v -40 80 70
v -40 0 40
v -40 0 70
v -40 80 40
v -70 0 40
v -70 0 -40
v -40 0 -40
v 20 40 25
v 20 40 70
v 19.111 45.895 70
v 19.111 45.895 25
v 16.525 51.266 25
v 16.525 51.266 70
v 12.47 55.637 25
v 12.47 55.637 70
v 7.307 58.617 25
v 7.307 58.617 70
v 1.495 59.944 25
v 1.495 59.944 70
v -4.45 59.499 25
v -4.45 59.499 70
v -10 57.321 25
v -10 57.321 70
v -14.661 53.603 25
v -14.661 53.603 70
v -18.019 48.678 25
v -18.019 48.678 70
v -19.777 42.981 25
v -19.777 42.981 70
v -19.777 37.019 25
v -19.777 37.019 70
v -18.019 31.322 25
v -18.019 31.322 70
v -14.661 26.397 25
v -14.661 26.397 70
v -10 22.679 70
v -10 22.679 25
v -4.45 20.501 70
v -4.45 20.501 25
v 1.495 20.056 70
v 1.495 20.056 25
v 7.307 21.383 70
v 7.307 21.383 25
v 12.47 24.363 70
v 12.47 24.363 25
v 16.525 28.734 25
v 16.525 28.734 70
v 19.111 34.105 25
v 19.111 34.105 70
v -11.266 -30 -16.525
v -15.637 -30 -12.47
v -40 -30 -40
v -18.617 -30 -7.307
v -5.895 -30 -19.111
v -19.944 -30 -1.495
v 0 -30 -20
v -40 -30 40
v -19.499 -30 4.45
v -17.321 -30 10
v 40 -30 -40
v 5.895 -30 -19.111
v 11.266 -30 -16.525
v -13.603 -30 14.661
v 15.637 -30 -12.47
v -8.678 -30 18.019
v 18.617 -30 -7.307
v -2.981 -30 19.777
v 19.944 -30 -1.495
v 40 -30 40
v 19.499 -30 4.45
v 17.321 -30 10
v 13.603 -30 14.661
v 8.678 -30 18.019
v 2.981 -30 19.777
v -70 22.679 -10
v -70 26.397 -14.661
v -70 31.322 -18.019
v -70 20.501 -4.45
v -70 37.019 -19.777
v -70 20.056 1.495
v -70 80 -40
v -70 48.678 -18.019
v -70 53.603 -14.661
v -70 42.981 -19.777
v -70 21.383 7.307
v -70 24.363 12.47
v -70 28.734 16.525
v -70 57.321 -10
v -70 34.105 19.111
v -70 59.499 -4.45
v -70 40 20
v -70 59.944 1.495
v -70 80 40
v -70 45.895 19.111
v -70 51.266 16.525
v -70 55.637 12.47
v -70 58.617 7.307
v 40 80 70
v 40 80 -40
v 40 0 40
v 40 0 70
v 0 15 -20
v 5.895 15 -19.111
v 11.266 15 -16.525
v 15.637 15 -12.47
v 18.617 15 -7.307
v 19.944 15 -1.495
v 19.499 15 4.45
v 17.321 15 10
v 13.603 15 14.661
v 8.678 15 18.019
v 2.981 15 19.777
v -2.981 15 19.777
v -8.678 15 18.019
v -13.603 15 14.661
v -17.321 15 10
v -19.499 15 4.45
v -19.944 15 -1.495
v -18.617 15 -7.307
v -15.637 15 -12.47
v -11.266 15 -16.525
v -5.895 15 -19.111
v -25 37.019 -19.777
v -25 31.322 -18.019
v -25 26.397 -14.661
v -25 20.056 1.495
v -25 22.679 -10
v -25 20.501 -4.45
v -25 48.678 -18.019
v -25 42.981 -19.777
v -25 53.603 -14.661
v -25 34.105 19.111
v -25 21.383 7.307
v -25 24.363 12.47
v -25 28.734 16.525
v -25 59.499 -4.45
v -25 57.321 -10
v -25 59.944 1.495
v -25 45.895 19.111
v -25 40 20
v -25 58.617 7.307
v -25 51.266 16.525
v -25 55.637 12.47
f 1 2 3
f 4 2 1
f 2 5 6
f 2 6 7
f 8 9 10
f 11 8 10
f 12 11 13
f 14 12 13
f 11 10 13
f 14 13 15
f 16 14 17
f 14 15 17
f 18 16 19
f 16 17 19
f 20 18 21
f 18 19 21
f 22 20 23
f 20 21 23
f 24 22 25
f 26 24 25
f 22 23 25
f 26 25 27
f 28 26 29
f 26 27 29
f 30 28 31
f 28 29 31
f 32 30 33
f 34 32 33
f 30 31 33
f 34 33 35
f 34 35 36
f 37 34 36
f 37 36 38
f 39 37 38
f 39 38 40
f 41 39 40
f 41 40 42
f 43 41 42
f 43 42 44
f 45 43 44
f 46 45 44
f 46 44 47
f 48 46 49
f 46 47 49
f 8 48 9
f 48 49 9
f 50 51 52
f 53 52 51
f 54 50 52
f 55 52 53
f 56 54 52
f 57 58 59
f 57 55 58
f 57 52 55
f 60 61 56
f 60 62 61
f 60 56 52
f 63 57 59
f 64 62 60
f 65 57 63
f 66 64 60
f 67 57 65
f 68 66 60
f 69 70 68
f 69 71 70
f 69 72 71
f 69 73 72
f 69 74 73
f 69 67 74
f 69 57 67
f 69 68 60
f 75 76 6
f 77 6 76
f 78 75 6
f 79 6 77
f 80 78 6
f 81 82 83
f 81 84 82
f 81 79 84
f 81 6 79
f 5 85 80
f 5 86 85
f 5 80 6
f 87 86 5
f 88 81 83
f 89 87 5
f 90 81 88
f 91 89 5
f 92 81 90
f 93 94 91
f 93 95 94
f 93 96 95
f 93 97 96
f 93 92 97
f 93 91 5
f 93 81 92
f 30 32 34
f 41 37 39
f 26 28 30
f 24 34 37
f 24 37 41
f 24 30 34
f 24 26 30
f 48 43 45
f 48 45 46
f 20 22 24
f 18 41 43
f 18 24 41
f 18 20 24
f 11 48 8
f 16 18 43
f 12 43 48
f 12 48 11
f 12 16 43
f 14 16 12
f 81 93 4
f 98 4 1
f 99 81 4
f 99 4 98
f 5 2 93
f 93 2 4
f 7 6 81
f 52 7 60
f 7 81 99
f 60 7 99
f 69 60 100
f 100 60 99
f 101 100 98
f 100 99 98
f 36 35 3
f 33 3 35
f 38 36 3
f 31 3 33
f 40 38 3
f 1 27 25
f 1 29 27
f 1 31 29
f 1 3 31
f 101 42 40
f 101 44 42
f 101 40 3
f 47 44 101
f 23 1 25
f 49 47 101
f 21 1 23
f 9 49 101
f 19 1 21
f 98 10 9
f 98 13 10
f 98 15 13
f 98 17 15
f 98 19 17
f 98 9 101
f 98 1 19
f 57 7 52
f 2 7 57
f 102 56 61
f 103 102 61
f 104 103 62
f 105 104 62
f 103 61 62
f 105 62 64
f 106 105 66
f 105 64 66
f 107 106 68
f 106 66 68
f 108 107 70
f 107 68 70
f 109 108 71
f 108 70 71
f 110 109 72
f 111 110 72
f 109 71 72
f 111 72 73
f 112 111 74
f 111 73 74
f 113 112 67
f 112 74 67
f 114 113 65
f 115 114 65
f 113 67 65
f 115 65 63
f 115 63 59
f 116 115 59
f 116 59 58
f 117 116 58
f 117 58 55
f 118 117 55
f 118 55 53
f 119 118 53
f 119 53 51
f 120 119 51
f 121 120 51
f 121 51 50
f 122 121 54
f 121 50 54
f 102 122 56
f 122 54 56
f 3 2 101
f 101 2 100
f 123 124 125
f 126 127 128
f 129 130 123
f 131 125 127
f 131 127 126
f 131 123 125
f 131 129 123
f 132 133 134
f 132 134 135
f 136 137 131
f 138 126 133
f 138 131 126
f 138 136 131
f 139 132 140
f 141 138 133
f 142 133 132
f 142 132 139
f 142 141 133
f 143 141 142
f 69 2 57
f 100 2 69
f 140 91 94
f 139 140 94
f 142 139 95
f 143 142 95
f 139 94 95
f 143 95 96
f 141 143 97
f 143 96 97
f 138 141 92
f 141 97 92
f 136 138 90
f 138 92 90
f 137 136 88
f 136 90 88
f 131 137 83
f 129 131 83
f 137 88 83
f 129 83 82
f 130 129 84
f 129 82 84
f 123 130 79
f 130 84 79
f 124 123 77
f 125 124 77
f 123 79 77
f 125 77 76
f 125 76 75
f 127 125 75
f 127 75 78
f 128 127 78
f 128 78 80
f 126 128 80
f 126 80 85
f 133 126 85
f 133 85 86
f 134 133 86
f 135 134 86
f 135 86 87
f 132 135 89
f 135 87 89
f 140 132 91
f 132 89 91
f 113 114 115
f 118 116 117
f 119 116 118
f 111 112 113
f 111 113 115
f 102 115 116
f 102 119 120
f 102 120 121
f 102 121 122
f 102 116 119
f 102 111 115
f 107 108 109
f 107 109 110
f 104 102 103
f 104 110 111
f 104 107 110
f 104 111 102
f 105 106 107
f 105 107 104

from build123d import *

# Parameters (mm, degrees)
ESQUISSE2_W             = 80
ESQUISSE2_H             = 80
BOSS_EXTRU_1_DEPTH      = 80
ESQUISSE5_W             = 80
ESQUISSE5_H             = 80
BOSS_EXTRU_2_DEPTH      = 30
ESQUISSE6_W             = 80
ESQUISSE6_H             = 80
BOSS_EXTRU_3_DEPTH      = 30
ESQUISSE7_W             = 80
ESQUISSE7_H             = 80
BOSS_EXTRU_4_DEPTH      = 30
ESQUISSE8_R             = 20
ENL_V_MAT_EXTRU_1_DEPTH = 45
ESQUISSE9_R             = 20
ENL_V_MAT_EXTRU_2_DEPTH = 45
ESQUISSE10_R            = 20
ENL_V_MAT_EXTRU_3_DEPTH = 45


with BuildPart() as part:
    # Esquisse2 → Boss.-Extru.1 (new body)
    with BuildSketch(Plane(origin=(0, 0, 0), x_dir=(1, 0, 0), z_dir=(0, 1, 0))):
        Rectangle(ESQUISSE2_W, ESQUISSE2_H)
    extrude(amount=BOSS_EXTRU_1_DEPTH)

    # Esquisse5 → Boss.-Extru.2 (add)
    with BuildSketch(Plane.ZY.offset(40)):
        with Locations((0, 40)):
            Rectangle(ESQUISSE5_W, ESQUISSE5_H)
    extrude(amount=BOSS_EXTRU_2_DEPTH)

    # Esquisse6 → Boss.-Extru.3 (add)
    with BuildSketch(Plane.XY.offset(40)):
        with Locations((0, 40)):
            Rectangle(ESQUISSE6_W, ESQUISSE6_H)
    extrude(amount=BOSS_EXTRU_3_DEPTH)

    # Esquisse7 → Boss.-Extru.4 (add)
    with BuildSketch(Plane.XZ):
        Rectangle(ESQUISSE7_W, ESQUISSE7_H)
    extrude(amount=BOSS_EXTRU_4_DEPTH)

    # Esquisse8 → Enlèv. mat.-Extru.1 (cut)
    with BuildSketch(Plane.ZY.offset(70)):
        with Locations((0, 40)):
            Circle(ESQUISSE8_R)
    extrude(amount=-ENL_V_MAT_EXTRU_1_DEPTH, mode=Mode.SUBTRACT)

    # Esquisse9 → Enlèv. mat.-Extru.2 (cut)
    with BuildSketch(Plane.XY.offset(70)):
        with Locations((0, 40)):
            Circle(ESQUISSE9_R)
    extrude(amount=-ENL_V_MAT_EXTRU_2_DEPTH, mode=Mode.SUBTRACT)

    # Esquisse10 → Enlèv. mat.-Extru.3 (cut)
    with BuildSketch(Plane.XZ.offset(30)):
        with Locations(Location((0, 0, 0), (0, 0, 270))):
            Circle(ESQUISSE10_R)
    extrude(amount=-ENL_V_MAT_EXTRU_3_DEPTH, mode=Mode.SUBTRACT)


solid = part.part
